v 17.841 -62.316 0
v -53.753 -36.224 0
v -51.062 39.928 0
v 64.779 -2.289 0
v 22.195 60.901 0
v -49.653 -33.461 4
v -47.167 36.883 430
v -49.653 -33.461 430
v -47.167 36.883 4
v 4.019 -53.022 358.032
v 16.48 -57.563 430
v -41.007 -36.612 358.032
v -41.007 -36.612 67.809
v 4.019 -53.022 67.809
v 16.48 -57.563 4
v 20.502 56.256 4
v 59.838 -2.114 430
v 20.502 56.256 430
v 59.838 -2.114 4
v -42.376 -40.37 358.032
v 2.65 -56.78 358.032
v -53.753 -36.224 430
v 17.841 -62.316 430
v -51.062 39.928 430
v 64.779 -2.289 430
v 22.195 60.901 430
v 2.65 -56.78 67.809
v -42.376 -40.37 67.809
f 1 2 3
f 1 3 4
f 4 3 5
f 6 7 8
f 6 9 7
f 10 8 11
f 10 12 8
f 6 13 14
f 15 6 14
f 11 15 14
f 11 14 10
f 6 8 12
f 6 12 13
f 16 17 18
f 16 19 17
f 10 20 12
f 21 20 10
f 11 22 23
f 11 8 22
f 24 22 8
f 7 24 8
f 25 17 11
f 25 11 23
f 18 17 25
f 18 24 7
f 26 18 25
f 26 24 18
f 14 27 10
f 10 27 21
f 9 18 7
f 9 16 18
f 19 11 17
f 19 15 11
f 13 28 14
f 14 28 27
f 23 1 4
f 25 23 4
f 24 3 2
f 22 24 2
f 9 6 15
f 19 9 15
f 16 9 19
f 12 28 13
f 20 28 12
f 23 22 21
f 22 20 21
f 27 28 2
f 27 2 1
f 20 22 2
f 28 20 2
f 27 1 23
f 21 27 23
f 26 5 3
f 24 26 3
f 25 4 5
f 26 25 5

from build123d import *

# Parameters (mm, degrees)
F1_DEPTH = 430
F2_T     = -4
F3_W     = 47.923155129
F3_H     = 290.2228236198
F4_DEPTH = 12.7


with BuildPart() as f1:
    # F0 (on Top) → F1 (new body)
    with BuildSketch(Plane.XY):
        Polygon((17.8408334003, -62.3160021047), (64.7791605856, -2.2890628103), (22.1948896043, 60.9012834855), (-51.0619644336, 39.9281259628), (-53.7529191566, -36.2243445334), align=None)
    extrude(amount=F1_DEPTH)

    # F2
    f2_openings = [f1.faces().sort_by_distance(p)[0] for p in [
        (0, 0, 430),
    ]]
    offset(amount=F2_T, openings=f2_openings)

    # F3 (on face) → F4 (cut)
    with BuildSketch(Plane(origin=(-17.9560428781, -49.270173319, 0), x_dir=(0.9395505585, -0.3424102043, 0), z_dir=(-0.3424102043, -0.9395505585, 0))):
        with Locations((-2.0299293101, 212.9202485085)):
            Rectangle(F3_W, F3_H)
    extrude(amount=-F4_DEPTH, mode=Mode.SUBTRACT)


solid = f1.part
